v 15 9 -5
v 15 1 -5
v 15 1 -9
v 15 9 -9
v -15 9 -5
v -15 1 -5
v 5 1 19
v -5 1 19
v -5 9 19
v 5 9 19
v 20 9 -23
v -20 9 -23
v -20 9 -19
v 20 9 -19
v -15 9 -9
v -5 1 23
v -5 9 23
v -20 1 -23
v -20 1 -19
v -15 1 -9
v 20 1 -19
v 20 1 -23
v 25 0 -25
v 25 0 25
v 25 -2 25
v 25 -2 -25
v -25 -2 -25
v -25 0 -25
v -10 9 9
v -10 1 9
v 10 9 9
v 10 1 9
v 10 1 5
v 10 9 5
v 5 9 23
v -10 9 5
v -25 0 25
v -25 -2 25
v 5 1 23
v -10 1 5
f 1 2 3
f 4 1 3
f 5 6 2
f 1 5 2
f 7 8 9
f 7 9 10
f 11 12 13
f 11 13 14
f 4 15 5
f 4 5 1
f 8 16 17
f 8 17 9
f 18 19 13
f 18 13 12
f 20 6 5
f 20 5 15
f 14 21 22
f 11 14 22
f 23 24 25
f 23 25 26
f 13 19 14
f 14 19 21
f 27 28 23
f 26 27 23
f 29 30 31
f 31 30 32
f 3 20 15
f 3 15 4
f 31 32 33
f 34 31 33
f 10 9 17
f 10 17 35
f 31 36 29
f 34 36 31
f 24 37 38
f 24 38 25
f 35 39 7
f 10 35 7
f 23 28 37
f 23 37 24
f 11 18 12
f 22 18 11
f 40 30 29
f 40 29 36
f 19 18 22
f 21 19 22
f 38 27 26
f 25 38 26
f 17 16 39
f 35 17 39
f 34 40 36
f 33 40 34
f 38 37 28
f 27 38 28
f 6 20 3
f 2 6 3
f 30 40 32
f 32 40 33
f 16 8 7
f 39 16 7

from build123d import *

# Parameters (mm, degrees)
SKETCH5_W             = 10
SKETCH5_H             = 4
BOSS_EXTRUDE4_DEPTH   = 8
SKETCH5_W_2           = 20
BOSS_EXTRUDE4_2_DEPTH = 8
SKETCH5_W_3           = 30
BOSS_EXTRUDE4_3_DEPTH = 8
SKETCH5_W_4           = 40
BOSS_EXTRUDE4_4_DEPTH = 8
SKETCH1_W             = 50
SKETCH1_H             = 50
BOSS_EXTRUDE5_DEPTH   = 2


with BuildPart() as part:
    # Sketch5 → Boss-Extrude4 (new body)
    with BuildSketch(Plane(origin=(0, 1, 0), x_dir=(1, 0, 0), z_dir=(0, 1, 0))):
        with Locations((0, -21)):
            Rectangle(SKETCH5_W, SKETCH5_H)
    extrude(amount=BOSS_EXTRUDE4_DEPTH)


with BuildPart() as body_2:
    # Sketch5 → Boss-Extrude4 2 (new body)
    with BuildSketch(Plane(origin=(0, 1, 0), x_dir=(1, 0, 0), z_dir=(0, 1, 0))):
        with Locations((0, -7)):
            Rectangle(SKETCH5_W_2, SKETCH5_H)
    extrude(amount=BOSS_EXTRUDE4_2_DEPTH)


with BuildPart() as body_3:
    # Sketch5 → Boss-Extrude4 3 (new body)
    with BuildSketch(Plane(origin=(0, 1, 0), x_dir=(1, 0, 0), z_dir=(0, 1, 0))):
        with Locations((0, 7)):
            Rectangle(SKETCH5_W_3, SKETCH5_H)
    extrude(amount=BOSS_EXTRUDE4_3_DEPTH)


with BuildPart() as body_4:
    # Sketch5 → Boss-Extrude4 4 (new body)
    with BuildSketch(Plane(origin=(0, 1, 0), x_dir=(1, 0, 0), z_dir=(0, 1, 0))):
        with Locations((0, 21)):
            Rectangle(SKETCH5_W_4, SKETCH5_H)
    extrude(amount=BOSS_EXTRUDE4_4_DEPTH)


with BuildPart() as body_5:
    # Sketch1 → Boss-Extrude5 (new body)
    with BuildSketch(Plane(origin=(0, 0, 0), x_dir=(1, 0, 0), z_dir=(0, 1, 0))):
        Rectangle(SKETCH1_W, SKETCH1_H)
    extrude(amount=-BOSS_EXTRUDE5_DEPTH)


solid = Compound([part.part, body_2.part, body_3.part, body_4.part, body_5.part])
